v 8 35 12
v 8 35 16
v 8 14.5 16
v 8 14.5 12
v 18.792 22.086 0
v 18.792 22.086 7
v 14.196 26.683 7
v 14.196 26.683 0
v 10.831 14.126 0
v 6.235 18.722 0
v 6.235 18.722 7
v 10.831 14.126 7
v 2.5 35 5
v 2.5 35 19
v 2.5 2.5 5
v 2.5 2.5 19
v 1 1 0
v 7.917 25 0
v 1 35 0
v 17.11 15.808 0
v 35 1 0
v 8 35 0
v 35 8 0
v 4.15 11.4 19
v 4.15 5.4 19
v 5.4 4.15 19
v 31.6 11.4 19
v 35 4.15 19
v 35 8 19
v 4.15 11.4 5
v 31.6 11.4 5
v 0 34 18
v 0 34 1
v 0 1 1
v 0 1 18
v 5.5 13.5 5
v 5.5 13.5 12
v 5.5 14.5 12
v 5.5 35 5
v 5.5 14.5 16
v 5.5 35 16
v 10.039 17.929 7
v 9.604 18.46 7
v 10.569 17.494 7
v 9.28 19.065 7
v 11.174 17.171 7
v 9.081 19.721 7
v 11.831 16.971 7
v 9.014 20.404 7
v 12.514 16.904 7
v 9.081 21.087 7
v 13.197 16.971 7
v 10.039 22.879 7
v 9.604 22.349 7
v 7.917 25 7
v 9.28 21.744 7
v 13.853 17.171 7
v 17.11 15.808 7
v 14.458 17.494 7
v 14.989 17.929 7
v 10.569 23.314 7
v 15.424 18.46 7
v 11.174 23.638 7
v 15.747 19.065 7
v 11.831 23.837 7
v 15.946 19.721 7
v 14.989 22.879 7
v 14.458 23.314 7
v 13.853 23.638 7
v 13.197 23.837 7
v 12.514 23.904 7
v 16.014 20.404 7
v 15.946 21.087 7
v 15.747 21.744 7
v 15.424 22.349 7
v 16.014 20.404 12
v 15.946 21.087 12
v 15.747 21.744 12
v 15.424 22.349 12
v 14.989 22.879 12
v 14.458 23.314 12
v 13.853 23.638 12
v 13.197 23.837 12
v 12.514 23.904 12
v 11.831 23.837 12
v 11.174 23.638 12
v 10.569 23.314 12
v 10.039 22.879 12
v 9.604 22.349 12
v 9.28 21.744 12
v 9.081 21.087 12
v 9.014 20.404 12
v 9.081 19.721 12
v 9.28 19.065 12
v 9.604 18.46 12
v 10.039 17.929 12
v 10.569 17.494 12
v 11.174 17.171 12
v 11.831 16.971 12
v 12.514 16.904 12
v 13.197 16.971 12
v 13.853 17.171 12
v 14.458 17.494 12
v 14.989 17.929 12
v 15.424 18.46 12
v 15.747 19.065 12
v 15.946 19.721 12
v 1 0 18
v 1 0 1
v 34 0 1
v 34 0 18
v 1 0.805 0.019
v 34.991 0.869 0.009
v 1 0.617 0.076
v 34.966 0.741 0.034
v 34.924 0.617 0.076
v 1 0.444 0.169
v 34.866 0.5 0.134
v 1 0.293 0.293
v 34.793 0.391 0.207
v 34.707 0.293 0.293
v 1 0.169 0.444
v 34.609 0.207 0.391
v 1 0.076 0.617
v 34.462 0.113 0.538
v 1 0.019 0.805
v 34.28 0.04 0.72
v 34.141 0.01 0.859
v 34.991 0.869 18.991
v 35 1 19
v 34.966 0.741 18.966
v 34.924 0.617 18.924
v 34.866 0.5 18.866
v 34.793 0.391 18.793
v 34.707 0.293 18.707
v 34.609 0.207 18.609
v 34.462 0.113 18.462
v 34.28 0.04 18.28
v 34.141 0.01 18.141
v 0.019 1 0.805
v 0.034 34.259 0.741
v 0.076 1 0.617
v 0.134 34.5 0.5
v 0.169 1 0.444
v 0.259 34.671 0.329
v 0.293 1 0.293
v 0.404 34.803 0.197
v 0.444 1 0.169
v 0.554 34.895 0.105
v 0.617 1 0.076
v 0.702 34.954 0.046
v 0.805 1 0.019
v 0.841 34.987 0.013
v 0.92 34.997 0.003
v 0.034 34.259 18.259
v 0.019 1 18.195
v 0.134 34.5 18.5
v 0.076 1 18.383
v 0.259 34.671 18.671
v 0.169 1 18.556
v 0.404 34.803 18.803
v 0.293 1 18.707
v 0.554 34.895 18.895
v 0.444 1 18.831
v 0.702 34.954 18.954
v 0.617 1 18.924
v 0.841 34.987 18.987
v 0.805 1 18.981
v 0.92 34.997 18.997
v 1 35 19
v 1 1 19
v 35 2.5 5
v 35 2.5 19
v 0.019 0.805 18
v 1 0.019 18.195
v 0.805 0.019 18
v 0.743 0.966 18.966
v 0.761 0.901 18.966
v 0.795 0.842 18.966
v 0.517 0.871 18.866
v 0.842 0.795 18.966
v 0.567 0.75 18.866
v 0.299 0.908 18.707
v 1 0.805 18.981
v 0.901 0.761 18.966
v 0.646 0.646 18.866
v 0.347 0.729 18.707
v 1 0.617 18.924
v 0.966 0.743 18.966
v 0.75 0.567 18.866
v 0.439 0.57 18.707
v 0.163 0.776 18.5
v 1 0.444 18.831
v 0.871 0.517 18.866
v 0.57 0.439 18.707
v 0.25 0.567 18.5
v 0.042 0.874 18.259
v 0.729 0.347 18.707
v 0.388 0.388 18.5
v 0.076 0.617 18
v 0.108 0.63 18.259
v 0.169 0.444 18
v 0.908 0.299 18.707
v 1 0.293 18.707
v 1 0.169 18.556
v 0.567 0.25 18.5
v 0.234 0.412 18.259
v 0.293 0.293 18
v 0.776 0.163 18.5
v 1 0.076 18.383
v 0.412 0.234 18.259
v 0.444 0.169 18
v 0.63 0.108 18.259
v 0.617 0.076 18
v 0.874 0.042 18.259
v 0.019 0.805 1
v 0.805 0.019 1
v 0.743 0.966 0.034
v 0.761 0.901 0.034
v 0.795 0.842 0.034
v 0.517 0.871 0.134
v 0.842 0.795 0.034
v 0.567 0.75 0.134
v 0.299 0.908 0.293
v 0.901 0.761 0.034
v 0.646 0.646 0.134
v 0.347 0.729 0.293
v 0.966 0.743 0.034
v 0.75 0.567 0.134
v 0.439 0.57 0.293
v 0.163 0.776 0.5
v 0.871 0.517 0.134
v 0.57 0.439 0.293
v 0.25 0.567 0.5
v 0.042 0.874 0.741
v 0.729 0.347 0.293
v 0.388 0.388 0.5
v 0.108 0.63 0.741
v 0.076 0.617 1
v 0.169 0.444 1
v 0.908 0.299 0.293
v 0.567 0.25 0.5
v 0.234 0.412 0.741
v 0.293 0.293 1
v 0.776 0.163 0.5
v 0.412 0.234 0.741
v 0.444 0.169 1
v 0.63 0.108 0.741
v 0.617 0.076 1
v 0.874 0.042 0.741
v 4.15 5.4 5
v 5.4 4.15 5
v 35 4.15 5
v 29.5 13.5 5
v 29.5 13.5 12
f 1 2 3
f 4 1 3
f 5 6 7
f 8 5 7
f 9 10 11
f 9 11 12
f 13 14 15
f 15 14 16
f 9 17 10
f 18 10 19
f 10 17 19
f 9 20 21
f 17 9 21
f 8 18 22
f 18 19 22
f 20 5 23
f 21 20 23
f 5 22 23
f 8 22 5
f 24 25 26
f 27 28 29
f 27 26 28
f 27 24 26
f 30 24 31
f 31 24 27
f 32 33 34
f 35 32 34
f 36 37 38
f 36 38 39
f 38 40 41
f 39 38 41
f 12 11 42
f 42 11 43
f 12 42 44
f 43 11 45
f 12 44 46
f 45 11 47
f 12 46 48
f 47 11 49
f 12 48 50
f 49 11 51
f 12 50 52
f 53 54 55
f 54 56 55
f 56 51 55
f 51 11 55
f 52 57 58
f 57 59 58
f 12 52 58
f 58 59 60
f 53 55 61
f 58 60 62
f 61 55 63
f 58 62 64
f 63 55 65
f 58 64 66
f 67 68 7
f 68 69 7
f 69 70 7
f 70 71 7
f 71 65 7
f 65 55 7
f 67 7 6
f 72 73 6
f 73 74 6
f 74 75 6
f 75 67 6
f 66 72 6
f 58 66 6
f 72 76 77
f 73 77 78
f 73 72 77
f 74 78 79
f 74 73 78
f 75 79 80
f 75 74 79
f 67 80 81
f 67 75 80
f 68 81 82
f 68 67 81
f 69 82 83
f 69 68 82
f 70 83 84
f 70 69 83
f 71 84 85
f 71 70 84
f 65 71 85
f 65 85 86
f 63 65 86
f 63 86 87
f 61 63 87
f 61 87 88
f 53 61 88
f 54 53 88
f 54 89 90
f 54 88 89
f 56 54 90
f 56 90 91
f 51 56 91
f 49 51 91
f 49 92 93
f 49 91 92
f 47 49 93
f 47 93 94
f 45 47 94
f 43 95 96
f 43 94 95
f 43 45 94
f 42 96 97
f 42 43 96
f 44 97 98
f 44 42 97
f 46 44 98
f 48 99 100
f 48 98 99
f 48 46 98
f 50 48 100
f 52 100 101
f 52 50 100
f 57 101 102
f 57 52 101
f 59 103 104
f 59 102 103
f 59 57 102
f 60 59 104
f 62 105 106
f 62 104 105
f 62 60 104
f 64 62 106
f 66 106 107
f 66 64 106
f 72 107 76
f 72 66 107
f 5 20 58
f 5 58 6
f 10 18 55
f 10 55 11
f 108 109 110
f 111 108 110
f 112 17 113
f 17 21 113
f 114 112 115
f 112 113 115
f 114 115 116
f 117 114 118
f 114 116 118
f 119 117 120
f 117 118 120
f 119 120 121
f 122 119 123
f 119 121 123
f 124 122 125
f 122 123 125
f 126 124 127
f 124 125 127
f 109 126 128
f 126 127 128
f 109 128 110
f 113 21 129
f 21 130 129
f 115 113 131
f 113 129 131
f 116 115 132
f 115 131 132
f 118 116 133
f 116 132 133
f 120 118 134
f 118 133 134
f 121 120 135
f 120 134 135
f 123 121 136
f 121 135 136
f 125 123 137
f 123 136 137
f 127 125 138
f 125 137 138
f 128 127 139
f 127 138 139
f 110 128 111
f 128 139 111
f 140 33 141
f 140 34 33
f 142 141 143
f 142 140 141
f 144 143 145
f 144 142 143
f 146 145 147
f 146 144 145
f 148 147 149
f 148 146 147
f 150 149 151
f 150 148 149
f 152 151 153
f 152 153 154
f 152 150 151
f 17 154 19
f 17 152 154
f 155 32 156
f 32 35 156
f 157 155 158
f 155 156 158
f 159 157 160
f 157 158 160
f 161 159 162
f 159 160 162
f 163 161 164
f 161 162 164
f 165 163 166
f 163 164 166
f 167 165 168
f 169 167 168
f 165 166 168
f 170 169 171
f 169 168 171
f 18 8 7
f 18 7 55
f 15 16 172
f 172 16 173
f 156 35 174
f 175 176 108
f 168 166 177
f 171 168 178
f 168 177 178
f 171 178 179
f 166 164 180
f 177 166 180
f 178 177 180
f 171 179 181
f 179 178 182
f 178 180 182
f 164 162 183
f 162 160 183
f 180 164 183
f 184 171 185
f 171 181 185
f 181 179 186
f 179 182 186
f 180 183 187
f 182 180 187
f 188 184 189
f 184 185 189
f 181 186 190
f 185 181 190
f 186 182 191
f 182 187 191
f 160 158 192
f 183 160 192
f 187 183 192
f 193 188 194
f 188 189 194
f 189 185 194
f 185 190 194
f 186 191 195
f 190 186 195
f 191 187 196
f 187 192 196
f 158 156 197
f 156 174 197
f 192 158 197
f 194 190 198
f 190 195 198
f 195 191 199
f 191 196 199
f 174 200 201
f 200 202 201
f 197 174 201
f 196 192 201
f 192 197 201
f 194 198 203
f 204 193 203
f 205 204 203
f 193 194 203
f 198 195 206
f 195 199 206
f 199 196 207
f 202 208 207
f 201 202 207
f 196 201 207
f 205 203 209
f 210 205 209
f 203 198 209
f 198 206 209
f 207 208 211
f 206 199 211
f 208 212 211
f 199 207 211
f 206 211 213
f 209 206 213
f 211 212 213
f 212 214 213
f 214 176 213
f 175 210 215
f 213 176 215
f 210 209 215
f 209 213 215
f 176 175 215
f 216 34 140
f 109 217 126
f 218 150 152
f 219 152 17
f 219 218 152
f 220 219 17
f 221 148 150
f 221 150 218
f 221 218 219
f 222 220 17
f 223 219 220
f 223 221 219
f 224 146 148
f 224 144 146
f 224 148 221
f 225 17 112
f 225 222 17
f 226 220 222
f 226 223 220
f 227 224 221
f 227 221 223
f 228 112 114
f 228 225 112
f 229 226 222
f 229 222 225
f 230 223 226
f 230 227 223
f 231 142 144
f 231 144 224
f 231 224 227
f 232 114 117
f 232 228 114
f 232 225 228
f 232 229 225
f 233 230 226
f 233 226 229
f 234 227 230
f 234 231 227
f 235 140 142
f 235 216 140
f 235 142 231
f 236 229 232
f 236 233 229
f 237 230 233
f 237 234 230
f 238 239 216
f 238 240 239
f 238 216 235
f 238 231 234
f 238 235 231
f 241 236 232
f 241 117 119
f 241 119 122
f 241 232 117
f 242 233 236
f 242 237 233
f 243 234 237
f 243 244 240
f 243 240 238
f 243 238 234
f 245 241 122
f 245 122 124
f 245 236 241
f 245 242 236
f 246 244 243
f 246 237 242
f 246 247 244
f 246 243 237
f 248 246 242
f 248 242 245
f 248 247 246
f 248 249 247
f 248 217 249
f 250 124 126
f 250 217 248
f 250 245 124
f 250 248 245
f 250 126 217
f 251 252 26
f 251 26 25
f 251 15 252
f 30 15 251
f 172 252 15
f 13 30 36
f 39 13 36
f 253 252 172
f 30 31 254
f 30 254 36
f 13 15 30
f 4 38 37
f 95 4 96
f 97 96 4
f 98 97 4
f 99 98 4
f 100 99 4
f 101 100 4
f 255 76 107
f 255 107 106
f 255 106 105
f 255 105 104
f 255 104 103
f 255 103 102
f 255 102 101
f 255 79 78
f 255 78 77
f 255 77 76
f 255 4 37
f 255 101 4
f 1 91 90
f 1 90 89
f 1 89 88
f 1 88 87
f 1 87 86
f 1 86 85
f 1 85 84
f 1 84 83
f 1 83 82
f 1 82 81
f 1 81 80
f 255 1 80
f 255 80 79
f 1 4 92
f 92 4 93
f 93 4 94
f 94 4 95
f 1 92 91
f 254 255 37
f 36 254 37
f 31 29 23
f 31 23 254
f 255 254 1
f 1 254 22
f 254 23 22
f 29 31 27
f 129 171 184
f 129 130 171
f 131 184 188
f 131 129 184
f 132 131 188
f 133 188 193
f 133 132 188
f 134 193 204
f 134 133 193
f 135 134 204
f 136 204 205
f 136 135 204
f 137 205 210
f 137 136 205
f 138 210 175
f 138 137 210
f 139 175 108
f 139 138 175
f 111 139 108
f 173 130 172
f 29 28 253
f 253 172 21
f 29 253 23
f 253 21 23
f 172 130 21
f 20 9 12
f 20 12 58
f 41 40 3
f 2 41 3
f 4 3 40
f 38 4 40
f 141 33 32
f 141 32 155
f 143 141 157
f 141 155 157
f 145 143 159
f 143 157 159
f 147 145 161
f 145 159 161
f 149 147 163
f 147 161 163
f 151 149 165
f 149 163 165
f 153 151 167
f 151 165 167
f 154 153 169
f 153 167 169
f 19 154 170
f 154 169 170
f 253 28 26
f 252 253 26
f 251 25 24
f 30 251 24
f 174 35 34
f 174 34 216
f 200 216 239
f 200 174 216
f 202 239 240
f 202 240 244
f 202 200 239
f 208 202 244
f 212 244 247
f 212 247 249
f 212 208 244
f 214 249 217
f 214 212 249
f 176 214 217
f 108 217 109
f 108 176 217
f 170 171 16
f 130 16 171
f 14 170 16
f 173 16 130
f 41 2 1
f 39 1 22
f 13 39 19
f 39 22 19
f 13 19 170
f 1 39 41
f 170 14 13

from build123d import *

# Parameters (mm, degrees)
F1_DEPTH  = 19
F3_DEPTH  = 14
F4_R      = 3.5
F5_DEPTH  = 7
F6_DEPTH  = 7
F7_DEPTH  = 25
F8_DEPTH  = 14
F9_R      = 1
F2_W      = 2.5
F2_H      = 20.5
F10_DEPTH = 3


with BuildPart() as f1:
    # F0 (on Top) → F1 (new body)
    with BuildSketch(Plane.XY):
        Polygon((0, 35), (0, 0), (35, 0), (35, 8), (8, 35), align=None)
    extrude(amount=F1_DEPTH)

    # F2 (on face) → F3 (cut)
    with BuildSketch(Plane.XY.offset(19)):
        Polygon((2.5, 2.5), (35, 2.5), (35, 4.15), (5.4, 4.15), (4.15, 5.4), (4.15, 11.4), (5.5, 11.4), (5.5, 13.5), (5.5, 14.5), (5.5, 35), (2.5, 35), align=None)
    extrude(amount=-F3_DEPTH, mode=Mode.SUBTRACT)

    # F4 (on face) → F5 (cut)
    with BuildSketch(Plane.XY):
        Polygon((18.7922096033, 22.0864700531), (14.1960155256, 26.6826641308), (7.9174976548, 25.0003403376), (6.2351738616, 18.7218224668), (10.8313679393, 14.125628389), (17.1098858102, 15.8079521822), align=None)
        with Locations((12.5136917325, 20.4041462599)):
            Circle(F4_R, mode=Mode.SUBTRACT)
    extrude(amount=F5_DEPTH, mode=Mode.SUBTRACT)

    # F2 (on face) → F6 (cut)
    with BuildSketch(Plane.XY.offset(19)):
        Polygon((8, 14.5), (5.5, 14.5), (5.5, 13.5), (29.5, 13.5), (8, 35), align=None)
    extrude(amount=-F6_DEPTH, mode=Mode.SUBTRACT)

    # F4 (on face) → F7 (cut)
    with BuildSketch(Plane.XY):
        with Locations((12.5136917325, 20.4041462599)):
            Circle(F4_R)
    extrude(amount=F7_DEPTH, mode=Mode.SUBTRACT)

    # F2 (on face) → F8 (cut)
    with BuildSketch(Plane.XY.offset(19)):
        Polygon((2.5, 2.5), (35, 2.5), (35, 4.15), (5.4, 4.15), (4.15, 5.4), (4.15, 11.4), (5.5, 11.4), (5.5, 13.5), (5.5, 14.5), (5.5, 35), (2.5, 35), align=None)
        Polygon((5.5, 11.4), (31.6, 11.4), (29.5, 13.5), (5.5, 13.5), align=None)
    extrude(amount=-F8_DEPTH, mode=Mode.SUBTRACT)

    # F9
    f9_edges = [f1.edges().sort_by_distance(p)[0] for p in [
        (0, 35, 9.5),
        (0, 0, 9.5),
        (0, 17.5, 0),
        (0, 17.5, 19),
        (35, 0, 9.5),
        (17.5, 0, 0),
        (17.5, 0, 19),
    ]]
    fillet(f9_edges, radius=F9_R)

    # F2 (on face) → F10 (cut)
    with BuildSketch(Plane.XY.offset(19)):
        with Locations((6.75, 24.75)):
            Rectangle(F2_W, F2_H)
    extrude(amount=-F10_DEPTH, mode=Mode.SUBTRACT)


solid = f1.part
